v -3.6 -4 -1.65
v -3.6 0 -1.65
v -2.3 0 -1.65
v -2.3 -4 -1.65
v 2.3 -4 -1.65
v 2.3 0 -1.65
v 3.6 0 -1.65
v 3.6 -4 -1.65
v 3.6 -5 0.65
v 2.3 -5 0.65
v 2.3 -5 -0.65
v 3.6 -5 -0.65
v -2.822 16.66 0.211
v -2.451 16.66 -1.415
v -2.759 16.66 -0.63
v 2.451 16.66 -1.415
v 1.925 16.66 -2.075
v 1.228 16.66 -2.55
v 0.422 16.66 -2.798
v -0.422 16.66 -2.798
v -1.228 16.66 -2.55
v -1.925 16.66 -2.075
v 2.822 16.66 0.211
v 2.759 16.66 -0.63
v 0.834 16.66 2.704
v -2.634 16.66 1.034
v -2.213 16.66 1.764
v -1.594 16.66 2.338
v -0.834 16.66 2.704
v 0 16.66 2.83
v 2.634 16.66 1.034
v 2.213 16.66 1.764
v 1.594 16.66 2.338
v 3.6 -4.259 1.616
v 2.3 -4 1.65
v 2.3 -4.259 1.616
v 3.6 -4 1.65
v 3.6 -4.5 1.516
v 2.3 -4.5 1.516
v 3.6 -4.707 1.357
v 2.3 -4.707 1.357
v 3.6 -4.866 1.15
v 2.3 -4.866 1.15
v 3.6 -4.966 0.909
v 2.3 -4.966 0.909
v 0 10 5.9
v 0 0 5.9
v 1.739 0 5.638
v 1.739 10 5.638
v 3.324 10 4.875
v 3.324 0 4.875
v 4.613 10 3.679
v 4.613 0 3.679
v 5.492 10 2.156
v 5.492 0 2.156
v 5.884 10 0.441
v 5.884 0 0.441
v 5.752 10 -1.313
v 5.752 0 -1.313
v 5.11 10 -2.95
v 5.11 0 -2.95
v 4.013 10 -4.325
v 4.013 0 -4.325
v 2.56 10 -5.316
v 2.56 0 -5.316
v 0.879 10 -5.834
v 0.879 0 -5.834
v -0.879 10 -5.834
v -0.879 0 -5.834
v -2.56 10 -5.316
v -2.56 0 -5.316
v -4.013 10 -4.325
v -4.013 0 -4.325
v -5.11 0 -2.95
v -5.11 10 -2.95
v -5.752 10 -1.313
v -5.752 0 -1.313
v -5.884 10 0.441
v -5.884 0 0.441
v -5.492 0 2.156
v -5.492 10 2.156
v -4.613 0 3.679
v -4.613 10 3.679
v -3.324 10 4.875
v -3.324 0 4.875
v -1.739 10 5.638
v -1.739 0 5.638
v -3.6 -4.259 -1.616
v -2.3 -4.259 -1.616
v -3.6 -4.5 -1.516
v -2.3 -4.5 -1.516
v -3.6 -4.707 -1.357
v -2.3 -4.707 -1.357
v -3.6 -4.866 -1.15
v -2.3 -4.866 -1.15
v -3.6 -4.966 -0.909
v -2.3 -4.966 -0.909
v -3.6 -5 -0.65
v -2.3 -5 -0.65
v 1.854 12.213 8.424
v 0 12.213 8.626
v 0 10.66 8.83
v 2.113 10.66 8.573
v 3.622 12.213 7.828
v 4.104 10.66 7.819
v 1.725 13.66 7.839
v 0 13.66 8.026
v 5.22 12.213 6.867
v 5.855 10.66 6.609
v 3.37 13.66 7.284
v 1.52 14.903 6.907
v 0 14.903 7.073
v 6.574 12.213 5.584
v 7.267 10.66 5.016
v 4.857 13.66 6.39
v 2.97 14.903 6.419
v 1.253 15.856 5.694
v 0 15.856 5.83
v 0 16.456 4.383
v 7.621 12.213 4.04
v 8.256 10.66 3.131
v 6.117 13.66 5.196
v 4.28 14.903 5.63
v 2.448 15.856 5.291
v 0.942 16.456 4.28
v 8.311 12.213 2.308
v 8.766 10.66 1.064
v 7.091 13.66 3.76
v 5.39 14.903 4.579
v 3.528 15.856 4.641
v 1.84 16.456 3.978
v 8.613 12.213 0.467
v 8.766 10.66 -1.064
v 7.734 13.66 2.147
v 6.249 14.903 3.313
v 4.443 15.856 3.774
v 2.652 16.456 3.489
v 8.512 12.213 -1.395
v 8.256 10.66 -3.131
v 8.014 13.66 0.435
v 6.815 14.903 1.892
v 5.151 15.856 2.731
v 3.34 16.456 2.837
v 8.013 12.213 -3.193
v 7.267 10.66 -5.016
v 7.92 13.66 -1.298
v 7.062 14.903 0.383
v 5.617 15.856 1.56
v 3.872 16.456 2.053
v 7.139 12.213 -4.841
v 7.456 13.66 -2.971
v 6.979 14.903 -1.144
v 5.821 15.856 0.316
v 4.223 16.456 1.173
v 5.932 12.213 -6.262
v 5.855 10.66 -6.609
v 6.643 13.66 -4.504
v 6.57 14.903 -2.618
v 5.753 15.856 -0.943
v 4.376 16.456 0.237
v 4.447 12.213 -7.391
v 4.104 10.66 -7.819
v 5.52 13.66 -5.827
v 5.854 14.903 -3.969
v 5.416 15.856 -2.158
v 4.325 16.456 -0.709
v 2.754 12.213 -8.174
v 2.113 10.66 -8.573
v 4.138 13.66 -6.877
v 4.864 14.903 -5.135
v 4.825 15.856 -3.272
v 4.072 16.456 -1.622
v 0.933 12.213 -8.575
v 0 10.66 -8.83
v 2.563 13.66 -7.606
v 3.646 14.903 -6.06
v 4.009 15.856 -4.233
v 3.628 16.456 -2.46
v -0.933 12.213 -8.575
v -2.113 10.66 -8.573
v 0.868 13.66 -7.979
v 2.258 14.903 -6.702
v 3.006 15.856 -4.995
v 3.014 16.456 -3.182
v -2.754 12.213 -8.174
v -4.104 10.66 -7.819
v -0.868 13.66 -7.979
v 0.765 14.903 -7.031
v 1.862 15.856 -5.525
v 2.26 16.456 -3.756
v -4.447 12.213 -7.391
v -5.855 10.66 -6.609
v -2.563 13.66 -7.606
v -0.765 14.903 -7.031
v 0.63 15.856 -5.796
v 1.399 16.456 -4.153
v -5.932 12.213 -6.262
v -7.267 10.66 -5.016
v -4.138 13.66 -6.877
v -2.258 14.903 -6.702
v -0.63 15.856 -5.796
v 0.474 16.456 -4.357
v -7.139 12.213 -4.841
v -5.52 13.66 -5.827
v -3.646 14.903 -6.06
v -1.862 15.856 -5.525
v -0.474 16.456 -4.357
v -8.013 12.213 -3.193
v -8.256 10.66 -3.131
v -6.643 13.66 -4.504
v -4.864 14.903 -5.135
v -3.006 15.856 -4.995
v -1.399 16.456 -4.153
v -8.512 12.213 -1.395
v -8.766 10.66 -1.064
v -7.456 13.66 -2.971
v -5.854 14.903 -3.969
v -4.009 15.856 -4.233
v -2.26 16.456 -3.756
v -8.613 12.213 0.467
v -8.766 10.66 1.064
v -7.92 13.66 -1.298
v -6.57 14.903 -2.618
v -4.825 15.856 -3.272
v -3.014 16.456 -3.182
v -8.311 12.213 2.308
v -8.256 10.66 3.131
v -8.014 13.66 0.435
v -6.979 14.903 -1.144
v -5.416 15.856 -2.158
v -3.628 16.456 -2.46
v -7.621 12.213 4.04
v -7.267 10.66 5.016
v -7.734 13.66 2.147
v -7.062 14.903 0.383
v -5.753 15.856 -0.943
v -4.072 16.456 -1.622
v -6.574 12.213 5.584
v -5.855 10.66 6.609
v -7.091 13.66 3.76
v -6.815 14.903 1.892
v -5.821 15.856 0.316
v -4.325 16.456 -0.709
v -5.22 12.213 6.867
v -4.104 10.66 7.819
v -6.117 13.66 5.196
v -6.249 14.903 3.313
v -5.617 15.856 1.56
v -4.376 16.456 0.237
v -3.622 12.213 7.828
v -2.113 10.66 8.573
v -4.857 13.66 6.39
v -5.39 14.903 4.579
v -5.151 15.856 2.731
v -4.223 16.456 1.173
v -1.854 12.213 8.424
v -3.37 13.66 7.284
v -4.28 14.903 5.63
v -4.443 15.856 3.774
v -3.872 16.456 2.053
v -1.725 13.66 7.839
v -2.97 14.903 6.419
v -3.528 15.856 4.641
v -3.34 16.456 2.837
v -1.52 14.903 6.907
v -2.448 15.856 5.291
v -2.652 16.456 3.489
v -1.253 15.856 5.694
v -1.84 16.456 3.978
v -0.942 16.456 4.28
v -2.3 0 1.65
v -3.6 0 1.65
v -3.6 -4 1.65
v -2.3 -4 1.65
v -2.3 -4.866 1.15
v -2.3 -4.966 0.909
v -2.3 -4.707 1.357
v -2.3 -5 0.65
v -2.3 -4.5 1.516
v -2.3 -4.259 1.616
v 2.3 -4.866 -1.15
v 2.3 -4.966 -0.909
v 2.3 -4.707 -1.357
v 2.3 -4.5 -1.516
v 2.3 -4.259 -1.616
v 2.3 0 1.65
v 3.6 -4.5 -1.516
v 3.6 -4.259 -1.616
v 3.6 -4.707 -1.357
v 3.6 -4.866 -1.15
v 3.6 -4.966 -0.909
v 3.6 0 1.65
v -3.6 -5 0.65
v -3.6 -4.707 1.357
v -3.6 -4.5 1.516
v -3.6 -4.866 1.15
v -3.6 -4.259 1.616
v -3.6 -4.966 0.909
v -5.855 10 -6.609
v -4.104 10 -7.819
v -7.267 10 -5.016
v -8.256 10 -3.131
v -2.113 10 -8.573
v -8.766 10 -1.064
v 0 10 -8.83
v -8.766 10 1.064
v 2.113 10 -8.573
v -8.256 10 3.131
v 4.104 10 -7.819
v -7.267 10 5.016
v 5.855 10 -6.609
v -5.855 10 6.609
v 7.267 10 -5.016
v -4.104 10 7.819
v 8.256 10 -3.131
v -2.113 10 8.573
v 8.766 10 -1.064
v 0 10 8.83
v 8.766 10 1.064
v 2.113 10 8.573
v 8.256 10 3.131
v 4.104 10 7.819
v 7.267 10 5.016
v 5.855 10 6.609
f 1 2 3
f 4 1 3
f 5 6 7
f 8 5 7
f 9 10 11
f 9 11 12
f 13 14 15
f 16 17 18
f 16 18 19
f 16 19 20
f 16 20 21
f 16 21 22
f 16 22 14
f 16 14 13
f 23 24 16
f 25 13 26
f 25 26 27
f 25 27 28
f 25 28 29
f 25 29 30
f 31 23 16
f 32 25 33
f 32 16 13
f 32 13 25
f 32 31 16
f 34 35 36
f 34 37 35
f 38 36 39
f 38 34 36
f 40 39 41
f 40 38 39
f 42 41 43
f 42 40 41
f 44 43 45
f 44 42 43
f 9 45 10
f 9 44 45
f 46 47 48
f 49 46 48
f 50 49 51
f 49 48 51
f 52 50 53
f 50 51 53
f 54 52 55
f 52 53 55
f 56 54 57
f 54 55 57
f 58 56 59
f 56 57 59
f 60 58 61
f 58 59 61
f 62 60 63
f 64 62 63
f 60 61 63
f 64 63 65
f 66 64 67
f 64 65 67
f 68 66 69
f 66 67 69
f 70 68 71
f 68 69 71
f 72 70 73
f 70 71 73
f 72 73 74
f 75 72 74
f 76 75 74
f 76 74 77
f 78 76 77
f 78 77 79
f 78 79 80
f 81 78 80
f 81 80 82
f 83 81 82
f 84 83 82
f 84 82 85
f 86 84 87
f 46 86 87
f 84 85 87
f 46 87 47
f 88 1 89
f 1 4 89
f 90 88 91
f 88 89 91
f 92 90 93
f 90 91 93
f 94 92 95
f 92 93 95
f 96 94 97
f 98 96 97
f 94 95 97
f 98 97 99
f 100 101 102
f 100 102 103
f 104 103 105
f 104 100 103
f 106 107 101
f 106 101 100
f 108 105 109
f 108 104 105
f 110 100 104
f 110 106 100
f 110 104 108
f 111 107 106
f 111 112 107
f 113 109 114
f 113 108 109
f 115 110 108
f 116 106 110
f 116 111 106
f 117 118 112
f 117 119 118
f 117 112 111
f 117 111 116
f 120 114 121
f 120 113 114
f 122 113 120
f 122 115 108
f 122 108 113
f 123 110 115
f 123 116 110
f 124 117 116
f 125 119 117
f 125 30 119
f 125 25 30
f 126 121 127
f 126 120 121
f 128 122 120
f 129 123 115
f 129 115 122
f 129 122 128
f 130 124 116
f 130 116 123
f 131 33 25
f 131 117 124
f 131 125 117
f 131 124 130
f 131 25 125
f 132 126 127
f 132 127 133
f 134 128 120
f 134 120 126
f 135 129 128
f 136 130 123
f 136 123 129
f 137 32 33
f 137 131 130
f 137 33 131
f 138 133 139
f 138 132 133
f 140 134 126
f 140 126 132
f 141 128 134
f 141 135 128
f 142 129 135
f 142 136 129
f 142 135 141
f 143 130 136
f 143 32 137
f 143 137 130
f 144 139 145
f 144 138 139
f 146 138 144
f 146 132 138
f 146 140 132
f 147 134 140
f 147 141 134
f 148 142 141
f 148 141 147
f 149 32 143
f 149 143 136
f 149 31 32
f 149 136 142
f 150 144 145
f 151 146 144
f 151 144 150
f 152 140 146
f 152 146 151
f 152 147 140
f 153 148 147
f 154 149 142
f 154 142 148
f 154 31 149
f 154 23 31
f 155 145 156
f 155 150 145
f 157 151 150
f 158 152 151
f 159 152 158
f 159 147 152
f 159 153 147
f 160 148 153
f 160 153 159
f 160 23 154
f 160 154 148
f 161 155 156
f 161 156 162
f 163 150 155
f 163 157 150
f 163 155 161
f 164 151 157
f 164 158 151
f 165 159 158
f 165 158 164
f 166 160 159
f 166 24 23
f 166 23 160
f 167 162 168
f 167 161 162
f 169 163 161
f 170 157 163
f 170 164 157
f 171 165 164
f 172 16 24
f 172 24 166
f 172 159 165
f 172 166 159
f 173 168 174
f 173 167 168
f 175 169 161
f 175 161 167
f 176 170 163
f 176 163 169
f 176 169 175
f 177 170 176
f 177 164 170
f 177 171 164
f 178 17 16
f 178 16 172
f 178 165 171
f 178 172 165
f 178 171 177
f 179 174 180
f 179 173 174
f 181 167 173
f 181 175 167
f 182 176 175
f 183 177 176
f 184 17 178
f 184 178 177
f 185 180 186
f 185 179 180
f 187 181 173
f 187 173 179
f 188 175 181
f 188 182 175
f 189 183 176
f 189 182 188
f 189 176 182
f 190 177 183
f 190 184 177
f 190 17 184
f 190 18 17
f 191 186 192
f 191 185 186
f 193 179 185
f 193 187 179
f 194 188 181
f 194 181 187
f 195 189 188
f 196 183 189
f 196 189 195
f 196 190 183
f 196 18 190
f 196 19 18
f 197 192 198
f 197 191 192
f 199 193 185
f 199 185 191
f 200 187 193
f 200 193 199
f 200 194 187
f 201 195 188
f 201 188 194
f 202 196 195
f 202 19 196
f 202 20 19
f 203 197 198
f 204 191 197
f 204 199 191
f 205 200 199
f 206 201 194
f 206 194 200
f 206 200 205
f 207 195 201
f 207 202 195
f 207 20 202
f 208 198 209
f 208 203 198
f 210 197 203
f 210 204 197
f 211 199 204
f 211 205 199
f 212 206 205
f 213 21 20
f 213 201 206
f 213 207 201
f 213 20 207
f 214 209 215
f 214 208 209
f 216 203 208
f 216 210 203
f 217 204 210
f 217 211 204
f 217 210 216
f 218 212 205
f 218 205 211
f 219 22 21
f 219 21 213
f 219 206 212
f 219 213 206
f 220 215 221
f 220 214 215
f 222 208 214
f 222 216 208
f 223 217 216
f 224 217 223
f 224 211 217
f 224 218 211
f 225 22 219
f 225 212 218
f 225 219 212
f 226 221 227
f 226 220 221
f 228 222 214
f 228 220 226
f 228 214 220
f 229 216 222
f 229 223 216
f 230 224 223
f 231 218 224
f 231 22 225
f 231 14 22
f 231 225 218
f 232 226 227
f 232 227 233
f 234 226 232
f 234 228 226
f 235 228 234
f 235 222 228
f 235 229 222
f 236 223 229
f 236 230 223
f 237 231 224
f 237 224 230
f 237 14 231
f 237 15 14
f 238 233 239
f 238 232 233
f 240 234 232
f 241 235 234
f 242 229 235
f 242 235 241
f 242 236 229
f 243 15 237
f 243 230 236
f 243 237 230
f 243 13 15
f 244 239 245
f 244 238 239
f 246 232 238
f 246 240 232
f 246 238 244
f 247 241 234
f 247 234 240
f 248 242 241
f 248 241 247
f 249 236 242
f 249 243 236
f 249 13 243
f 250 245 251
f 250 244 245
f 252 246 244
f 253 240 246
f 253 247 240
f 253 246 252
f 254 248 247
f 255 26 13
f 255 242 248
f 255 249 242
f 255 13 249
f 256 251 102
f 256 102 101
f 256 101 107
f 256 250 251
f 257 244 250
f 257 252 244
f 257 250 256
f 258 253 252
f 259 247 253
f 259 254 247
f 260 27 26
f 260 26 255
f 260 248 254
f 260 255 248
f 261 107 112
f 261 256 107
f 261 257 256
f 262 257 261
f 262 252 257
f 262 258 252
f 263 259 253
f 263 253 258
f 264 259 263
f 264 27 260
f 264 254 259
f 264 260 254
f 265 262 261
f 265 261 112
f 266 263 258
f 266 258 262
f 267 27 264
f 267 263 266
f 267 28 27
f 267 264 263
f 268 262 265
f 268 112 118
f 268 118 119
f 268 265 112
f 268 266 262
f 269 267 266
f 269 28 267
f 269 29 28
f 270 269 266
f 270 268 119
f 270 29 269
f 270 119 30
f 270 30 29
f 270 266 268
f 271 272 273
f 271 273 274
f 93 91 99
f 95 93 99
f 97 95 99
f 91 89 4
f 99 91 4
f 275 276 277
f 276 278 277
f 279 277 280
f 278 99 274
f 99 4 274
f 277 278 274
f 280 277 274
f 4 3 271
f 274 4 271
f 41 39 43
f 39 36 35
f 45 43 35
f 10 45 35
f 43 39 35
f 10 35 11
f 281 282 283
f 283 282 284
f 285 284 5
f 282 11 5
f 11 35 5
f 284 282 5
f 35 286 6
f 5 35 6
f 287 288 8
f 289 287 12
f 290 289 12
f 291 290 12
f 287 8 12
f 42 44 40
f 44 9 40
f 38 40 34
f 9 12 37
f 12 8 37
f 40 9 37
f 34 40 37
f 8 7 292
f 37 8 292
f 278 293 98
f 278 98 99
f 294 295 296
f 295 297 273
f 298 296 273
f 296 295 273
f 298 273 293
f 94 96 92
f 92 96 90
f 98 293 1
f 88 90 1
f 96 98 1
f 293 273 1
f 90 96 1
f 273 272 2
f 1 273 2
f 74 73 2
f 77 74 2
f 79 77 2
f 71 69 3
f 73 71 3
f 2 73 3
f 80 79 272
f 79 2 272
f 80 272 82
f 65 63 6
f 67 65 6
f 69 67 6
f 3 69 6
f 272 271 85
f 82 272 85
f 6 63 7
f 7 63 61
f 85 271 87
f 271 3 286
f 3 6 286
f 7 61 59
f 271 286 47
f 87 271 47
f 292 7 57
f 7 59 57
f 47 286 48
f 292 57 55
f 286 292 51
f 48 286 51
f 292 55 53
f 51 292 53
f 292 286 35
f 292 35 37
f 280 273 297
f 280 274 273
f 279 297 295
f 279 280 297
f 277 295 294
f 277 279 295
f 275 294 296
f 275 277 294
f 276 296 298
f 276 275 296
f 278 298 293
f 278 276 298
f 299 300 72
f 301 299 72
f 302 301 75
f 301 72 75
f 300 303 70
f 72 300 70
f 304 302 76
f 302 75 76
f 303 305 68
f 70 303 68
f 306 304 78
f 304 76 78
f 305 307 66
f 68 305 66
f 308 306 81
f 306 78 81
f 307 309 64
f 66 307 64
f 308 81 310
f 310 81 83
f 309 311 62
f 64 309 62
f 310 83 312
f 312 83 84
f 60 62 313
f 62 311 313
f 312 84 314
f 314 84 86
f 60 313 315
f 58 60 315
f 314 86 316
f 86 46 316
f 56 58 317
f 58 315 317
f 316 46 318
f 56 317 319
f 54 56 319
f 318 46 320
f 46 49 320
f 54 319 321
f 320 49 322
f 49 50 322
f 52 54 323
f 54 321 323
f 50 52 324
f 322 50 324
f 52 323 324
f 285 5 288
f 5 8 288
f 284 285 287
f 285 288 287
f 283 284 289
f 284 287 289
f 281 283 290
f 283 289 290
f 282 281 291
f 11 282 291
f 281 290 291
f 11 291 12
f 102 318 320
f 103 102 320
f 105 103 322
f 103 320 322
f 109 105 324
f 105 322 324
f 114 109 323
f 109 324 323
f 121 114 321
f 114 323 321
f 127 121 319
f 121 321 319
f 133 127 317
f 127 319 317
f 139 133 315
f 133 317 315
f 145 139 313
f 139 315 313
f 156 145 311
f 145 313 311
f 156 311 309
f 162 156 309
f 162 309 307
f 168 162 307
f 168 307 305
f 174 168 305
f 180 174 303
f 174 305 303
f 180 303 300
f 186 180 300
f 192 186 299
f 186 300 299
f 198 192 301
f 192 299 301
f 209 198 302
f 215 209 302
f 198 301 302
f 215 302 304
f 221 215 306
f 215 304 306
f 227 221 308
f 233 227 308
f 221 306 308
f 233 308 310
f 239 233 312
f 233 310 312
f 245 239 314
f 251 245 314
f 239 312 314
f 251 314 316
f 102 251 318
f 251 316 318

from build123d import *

# Parameters (mm, degrees)
SKETCH1_R           = 5.9
BOSS_EXTRUDE1_DEPTH = 10
SKETCH2_R           = 8.83
BOSS_EXTRUDE2_DEPTH = 6.66
FILLET1_R           = 6
SKETCH3_W           = 1.3
SKETCH3_H           = 1.65
BOSS_EXTRUDE3_DEPTH = 5
FILLET2_R           = 1


with BuildPart() as part:
    # Sketch1 → Boss-Extrude1 (new body)
    with BuildSketch(Plane(origin=(0, 0, 0), x_dir=(1, 0, 0), z_dir=(0, 1, 0))):
        with Locations(Location((0, 0, 0), (0, 0, 270))):
            Circle(SKETCH1_R)
    extrude(amount=BOSS_EXTRUDE1_DEPTH)

    # Sketch2 → Boss-Extrude2 (add)
    with BuildSketch(Plane(origin=(0, 10, 0), x_dir=(1, 0, 0), z_dir=(0, 1, 0))):
        with Locations(Location((0, 0, 0), (0, 0, 270))):
            Circle(SKETCH2_R)
    extrude(amount=BOSS_EXTRUDE2_DEPTH)

    # Fillet1
    fillet1_edges = [part.edges().sort_by_distance(p)[0] for p in [
        (0, 16.66, -8.83),
    ]]
    fillet(fillet1_edges, radius=FILLET1_R)

    # Sketch3 → Boss-Extrude3 (add)
    with BuildSketch(Plane.XZ):
        with Locations((2.95, -0.825)):
            Rectangle(SKETCH3_W, SKETCH3_H)
        with Locations((2.95, 0.825)):
            Rectangle(SKETCH3_W, SKETCH3_H)
        with Locations((-2.95, 0.825)):
            Rectangle(SKETCH3_W, SKETCH3_H)
        with Locations((-2.95, -0.825)):
            Rectangle(SKETCH3_W, SKETCH3_H)
    extrude(amount=BOSS_EXTRUDE3_DEPTH)

    # Fillet2
    fillet2_edges = [part.edges().sort_by_distance(p)[0] for p in [
        (2.95, -5, -1.65),
        (2.95, -5, 1.65),
        (-2.95, -5, 1.65),
        (-2.95, -5, -1.65),
    ]]
    fillet(fillet2_edges, radius=FILLET2_R)


solid = part.part
